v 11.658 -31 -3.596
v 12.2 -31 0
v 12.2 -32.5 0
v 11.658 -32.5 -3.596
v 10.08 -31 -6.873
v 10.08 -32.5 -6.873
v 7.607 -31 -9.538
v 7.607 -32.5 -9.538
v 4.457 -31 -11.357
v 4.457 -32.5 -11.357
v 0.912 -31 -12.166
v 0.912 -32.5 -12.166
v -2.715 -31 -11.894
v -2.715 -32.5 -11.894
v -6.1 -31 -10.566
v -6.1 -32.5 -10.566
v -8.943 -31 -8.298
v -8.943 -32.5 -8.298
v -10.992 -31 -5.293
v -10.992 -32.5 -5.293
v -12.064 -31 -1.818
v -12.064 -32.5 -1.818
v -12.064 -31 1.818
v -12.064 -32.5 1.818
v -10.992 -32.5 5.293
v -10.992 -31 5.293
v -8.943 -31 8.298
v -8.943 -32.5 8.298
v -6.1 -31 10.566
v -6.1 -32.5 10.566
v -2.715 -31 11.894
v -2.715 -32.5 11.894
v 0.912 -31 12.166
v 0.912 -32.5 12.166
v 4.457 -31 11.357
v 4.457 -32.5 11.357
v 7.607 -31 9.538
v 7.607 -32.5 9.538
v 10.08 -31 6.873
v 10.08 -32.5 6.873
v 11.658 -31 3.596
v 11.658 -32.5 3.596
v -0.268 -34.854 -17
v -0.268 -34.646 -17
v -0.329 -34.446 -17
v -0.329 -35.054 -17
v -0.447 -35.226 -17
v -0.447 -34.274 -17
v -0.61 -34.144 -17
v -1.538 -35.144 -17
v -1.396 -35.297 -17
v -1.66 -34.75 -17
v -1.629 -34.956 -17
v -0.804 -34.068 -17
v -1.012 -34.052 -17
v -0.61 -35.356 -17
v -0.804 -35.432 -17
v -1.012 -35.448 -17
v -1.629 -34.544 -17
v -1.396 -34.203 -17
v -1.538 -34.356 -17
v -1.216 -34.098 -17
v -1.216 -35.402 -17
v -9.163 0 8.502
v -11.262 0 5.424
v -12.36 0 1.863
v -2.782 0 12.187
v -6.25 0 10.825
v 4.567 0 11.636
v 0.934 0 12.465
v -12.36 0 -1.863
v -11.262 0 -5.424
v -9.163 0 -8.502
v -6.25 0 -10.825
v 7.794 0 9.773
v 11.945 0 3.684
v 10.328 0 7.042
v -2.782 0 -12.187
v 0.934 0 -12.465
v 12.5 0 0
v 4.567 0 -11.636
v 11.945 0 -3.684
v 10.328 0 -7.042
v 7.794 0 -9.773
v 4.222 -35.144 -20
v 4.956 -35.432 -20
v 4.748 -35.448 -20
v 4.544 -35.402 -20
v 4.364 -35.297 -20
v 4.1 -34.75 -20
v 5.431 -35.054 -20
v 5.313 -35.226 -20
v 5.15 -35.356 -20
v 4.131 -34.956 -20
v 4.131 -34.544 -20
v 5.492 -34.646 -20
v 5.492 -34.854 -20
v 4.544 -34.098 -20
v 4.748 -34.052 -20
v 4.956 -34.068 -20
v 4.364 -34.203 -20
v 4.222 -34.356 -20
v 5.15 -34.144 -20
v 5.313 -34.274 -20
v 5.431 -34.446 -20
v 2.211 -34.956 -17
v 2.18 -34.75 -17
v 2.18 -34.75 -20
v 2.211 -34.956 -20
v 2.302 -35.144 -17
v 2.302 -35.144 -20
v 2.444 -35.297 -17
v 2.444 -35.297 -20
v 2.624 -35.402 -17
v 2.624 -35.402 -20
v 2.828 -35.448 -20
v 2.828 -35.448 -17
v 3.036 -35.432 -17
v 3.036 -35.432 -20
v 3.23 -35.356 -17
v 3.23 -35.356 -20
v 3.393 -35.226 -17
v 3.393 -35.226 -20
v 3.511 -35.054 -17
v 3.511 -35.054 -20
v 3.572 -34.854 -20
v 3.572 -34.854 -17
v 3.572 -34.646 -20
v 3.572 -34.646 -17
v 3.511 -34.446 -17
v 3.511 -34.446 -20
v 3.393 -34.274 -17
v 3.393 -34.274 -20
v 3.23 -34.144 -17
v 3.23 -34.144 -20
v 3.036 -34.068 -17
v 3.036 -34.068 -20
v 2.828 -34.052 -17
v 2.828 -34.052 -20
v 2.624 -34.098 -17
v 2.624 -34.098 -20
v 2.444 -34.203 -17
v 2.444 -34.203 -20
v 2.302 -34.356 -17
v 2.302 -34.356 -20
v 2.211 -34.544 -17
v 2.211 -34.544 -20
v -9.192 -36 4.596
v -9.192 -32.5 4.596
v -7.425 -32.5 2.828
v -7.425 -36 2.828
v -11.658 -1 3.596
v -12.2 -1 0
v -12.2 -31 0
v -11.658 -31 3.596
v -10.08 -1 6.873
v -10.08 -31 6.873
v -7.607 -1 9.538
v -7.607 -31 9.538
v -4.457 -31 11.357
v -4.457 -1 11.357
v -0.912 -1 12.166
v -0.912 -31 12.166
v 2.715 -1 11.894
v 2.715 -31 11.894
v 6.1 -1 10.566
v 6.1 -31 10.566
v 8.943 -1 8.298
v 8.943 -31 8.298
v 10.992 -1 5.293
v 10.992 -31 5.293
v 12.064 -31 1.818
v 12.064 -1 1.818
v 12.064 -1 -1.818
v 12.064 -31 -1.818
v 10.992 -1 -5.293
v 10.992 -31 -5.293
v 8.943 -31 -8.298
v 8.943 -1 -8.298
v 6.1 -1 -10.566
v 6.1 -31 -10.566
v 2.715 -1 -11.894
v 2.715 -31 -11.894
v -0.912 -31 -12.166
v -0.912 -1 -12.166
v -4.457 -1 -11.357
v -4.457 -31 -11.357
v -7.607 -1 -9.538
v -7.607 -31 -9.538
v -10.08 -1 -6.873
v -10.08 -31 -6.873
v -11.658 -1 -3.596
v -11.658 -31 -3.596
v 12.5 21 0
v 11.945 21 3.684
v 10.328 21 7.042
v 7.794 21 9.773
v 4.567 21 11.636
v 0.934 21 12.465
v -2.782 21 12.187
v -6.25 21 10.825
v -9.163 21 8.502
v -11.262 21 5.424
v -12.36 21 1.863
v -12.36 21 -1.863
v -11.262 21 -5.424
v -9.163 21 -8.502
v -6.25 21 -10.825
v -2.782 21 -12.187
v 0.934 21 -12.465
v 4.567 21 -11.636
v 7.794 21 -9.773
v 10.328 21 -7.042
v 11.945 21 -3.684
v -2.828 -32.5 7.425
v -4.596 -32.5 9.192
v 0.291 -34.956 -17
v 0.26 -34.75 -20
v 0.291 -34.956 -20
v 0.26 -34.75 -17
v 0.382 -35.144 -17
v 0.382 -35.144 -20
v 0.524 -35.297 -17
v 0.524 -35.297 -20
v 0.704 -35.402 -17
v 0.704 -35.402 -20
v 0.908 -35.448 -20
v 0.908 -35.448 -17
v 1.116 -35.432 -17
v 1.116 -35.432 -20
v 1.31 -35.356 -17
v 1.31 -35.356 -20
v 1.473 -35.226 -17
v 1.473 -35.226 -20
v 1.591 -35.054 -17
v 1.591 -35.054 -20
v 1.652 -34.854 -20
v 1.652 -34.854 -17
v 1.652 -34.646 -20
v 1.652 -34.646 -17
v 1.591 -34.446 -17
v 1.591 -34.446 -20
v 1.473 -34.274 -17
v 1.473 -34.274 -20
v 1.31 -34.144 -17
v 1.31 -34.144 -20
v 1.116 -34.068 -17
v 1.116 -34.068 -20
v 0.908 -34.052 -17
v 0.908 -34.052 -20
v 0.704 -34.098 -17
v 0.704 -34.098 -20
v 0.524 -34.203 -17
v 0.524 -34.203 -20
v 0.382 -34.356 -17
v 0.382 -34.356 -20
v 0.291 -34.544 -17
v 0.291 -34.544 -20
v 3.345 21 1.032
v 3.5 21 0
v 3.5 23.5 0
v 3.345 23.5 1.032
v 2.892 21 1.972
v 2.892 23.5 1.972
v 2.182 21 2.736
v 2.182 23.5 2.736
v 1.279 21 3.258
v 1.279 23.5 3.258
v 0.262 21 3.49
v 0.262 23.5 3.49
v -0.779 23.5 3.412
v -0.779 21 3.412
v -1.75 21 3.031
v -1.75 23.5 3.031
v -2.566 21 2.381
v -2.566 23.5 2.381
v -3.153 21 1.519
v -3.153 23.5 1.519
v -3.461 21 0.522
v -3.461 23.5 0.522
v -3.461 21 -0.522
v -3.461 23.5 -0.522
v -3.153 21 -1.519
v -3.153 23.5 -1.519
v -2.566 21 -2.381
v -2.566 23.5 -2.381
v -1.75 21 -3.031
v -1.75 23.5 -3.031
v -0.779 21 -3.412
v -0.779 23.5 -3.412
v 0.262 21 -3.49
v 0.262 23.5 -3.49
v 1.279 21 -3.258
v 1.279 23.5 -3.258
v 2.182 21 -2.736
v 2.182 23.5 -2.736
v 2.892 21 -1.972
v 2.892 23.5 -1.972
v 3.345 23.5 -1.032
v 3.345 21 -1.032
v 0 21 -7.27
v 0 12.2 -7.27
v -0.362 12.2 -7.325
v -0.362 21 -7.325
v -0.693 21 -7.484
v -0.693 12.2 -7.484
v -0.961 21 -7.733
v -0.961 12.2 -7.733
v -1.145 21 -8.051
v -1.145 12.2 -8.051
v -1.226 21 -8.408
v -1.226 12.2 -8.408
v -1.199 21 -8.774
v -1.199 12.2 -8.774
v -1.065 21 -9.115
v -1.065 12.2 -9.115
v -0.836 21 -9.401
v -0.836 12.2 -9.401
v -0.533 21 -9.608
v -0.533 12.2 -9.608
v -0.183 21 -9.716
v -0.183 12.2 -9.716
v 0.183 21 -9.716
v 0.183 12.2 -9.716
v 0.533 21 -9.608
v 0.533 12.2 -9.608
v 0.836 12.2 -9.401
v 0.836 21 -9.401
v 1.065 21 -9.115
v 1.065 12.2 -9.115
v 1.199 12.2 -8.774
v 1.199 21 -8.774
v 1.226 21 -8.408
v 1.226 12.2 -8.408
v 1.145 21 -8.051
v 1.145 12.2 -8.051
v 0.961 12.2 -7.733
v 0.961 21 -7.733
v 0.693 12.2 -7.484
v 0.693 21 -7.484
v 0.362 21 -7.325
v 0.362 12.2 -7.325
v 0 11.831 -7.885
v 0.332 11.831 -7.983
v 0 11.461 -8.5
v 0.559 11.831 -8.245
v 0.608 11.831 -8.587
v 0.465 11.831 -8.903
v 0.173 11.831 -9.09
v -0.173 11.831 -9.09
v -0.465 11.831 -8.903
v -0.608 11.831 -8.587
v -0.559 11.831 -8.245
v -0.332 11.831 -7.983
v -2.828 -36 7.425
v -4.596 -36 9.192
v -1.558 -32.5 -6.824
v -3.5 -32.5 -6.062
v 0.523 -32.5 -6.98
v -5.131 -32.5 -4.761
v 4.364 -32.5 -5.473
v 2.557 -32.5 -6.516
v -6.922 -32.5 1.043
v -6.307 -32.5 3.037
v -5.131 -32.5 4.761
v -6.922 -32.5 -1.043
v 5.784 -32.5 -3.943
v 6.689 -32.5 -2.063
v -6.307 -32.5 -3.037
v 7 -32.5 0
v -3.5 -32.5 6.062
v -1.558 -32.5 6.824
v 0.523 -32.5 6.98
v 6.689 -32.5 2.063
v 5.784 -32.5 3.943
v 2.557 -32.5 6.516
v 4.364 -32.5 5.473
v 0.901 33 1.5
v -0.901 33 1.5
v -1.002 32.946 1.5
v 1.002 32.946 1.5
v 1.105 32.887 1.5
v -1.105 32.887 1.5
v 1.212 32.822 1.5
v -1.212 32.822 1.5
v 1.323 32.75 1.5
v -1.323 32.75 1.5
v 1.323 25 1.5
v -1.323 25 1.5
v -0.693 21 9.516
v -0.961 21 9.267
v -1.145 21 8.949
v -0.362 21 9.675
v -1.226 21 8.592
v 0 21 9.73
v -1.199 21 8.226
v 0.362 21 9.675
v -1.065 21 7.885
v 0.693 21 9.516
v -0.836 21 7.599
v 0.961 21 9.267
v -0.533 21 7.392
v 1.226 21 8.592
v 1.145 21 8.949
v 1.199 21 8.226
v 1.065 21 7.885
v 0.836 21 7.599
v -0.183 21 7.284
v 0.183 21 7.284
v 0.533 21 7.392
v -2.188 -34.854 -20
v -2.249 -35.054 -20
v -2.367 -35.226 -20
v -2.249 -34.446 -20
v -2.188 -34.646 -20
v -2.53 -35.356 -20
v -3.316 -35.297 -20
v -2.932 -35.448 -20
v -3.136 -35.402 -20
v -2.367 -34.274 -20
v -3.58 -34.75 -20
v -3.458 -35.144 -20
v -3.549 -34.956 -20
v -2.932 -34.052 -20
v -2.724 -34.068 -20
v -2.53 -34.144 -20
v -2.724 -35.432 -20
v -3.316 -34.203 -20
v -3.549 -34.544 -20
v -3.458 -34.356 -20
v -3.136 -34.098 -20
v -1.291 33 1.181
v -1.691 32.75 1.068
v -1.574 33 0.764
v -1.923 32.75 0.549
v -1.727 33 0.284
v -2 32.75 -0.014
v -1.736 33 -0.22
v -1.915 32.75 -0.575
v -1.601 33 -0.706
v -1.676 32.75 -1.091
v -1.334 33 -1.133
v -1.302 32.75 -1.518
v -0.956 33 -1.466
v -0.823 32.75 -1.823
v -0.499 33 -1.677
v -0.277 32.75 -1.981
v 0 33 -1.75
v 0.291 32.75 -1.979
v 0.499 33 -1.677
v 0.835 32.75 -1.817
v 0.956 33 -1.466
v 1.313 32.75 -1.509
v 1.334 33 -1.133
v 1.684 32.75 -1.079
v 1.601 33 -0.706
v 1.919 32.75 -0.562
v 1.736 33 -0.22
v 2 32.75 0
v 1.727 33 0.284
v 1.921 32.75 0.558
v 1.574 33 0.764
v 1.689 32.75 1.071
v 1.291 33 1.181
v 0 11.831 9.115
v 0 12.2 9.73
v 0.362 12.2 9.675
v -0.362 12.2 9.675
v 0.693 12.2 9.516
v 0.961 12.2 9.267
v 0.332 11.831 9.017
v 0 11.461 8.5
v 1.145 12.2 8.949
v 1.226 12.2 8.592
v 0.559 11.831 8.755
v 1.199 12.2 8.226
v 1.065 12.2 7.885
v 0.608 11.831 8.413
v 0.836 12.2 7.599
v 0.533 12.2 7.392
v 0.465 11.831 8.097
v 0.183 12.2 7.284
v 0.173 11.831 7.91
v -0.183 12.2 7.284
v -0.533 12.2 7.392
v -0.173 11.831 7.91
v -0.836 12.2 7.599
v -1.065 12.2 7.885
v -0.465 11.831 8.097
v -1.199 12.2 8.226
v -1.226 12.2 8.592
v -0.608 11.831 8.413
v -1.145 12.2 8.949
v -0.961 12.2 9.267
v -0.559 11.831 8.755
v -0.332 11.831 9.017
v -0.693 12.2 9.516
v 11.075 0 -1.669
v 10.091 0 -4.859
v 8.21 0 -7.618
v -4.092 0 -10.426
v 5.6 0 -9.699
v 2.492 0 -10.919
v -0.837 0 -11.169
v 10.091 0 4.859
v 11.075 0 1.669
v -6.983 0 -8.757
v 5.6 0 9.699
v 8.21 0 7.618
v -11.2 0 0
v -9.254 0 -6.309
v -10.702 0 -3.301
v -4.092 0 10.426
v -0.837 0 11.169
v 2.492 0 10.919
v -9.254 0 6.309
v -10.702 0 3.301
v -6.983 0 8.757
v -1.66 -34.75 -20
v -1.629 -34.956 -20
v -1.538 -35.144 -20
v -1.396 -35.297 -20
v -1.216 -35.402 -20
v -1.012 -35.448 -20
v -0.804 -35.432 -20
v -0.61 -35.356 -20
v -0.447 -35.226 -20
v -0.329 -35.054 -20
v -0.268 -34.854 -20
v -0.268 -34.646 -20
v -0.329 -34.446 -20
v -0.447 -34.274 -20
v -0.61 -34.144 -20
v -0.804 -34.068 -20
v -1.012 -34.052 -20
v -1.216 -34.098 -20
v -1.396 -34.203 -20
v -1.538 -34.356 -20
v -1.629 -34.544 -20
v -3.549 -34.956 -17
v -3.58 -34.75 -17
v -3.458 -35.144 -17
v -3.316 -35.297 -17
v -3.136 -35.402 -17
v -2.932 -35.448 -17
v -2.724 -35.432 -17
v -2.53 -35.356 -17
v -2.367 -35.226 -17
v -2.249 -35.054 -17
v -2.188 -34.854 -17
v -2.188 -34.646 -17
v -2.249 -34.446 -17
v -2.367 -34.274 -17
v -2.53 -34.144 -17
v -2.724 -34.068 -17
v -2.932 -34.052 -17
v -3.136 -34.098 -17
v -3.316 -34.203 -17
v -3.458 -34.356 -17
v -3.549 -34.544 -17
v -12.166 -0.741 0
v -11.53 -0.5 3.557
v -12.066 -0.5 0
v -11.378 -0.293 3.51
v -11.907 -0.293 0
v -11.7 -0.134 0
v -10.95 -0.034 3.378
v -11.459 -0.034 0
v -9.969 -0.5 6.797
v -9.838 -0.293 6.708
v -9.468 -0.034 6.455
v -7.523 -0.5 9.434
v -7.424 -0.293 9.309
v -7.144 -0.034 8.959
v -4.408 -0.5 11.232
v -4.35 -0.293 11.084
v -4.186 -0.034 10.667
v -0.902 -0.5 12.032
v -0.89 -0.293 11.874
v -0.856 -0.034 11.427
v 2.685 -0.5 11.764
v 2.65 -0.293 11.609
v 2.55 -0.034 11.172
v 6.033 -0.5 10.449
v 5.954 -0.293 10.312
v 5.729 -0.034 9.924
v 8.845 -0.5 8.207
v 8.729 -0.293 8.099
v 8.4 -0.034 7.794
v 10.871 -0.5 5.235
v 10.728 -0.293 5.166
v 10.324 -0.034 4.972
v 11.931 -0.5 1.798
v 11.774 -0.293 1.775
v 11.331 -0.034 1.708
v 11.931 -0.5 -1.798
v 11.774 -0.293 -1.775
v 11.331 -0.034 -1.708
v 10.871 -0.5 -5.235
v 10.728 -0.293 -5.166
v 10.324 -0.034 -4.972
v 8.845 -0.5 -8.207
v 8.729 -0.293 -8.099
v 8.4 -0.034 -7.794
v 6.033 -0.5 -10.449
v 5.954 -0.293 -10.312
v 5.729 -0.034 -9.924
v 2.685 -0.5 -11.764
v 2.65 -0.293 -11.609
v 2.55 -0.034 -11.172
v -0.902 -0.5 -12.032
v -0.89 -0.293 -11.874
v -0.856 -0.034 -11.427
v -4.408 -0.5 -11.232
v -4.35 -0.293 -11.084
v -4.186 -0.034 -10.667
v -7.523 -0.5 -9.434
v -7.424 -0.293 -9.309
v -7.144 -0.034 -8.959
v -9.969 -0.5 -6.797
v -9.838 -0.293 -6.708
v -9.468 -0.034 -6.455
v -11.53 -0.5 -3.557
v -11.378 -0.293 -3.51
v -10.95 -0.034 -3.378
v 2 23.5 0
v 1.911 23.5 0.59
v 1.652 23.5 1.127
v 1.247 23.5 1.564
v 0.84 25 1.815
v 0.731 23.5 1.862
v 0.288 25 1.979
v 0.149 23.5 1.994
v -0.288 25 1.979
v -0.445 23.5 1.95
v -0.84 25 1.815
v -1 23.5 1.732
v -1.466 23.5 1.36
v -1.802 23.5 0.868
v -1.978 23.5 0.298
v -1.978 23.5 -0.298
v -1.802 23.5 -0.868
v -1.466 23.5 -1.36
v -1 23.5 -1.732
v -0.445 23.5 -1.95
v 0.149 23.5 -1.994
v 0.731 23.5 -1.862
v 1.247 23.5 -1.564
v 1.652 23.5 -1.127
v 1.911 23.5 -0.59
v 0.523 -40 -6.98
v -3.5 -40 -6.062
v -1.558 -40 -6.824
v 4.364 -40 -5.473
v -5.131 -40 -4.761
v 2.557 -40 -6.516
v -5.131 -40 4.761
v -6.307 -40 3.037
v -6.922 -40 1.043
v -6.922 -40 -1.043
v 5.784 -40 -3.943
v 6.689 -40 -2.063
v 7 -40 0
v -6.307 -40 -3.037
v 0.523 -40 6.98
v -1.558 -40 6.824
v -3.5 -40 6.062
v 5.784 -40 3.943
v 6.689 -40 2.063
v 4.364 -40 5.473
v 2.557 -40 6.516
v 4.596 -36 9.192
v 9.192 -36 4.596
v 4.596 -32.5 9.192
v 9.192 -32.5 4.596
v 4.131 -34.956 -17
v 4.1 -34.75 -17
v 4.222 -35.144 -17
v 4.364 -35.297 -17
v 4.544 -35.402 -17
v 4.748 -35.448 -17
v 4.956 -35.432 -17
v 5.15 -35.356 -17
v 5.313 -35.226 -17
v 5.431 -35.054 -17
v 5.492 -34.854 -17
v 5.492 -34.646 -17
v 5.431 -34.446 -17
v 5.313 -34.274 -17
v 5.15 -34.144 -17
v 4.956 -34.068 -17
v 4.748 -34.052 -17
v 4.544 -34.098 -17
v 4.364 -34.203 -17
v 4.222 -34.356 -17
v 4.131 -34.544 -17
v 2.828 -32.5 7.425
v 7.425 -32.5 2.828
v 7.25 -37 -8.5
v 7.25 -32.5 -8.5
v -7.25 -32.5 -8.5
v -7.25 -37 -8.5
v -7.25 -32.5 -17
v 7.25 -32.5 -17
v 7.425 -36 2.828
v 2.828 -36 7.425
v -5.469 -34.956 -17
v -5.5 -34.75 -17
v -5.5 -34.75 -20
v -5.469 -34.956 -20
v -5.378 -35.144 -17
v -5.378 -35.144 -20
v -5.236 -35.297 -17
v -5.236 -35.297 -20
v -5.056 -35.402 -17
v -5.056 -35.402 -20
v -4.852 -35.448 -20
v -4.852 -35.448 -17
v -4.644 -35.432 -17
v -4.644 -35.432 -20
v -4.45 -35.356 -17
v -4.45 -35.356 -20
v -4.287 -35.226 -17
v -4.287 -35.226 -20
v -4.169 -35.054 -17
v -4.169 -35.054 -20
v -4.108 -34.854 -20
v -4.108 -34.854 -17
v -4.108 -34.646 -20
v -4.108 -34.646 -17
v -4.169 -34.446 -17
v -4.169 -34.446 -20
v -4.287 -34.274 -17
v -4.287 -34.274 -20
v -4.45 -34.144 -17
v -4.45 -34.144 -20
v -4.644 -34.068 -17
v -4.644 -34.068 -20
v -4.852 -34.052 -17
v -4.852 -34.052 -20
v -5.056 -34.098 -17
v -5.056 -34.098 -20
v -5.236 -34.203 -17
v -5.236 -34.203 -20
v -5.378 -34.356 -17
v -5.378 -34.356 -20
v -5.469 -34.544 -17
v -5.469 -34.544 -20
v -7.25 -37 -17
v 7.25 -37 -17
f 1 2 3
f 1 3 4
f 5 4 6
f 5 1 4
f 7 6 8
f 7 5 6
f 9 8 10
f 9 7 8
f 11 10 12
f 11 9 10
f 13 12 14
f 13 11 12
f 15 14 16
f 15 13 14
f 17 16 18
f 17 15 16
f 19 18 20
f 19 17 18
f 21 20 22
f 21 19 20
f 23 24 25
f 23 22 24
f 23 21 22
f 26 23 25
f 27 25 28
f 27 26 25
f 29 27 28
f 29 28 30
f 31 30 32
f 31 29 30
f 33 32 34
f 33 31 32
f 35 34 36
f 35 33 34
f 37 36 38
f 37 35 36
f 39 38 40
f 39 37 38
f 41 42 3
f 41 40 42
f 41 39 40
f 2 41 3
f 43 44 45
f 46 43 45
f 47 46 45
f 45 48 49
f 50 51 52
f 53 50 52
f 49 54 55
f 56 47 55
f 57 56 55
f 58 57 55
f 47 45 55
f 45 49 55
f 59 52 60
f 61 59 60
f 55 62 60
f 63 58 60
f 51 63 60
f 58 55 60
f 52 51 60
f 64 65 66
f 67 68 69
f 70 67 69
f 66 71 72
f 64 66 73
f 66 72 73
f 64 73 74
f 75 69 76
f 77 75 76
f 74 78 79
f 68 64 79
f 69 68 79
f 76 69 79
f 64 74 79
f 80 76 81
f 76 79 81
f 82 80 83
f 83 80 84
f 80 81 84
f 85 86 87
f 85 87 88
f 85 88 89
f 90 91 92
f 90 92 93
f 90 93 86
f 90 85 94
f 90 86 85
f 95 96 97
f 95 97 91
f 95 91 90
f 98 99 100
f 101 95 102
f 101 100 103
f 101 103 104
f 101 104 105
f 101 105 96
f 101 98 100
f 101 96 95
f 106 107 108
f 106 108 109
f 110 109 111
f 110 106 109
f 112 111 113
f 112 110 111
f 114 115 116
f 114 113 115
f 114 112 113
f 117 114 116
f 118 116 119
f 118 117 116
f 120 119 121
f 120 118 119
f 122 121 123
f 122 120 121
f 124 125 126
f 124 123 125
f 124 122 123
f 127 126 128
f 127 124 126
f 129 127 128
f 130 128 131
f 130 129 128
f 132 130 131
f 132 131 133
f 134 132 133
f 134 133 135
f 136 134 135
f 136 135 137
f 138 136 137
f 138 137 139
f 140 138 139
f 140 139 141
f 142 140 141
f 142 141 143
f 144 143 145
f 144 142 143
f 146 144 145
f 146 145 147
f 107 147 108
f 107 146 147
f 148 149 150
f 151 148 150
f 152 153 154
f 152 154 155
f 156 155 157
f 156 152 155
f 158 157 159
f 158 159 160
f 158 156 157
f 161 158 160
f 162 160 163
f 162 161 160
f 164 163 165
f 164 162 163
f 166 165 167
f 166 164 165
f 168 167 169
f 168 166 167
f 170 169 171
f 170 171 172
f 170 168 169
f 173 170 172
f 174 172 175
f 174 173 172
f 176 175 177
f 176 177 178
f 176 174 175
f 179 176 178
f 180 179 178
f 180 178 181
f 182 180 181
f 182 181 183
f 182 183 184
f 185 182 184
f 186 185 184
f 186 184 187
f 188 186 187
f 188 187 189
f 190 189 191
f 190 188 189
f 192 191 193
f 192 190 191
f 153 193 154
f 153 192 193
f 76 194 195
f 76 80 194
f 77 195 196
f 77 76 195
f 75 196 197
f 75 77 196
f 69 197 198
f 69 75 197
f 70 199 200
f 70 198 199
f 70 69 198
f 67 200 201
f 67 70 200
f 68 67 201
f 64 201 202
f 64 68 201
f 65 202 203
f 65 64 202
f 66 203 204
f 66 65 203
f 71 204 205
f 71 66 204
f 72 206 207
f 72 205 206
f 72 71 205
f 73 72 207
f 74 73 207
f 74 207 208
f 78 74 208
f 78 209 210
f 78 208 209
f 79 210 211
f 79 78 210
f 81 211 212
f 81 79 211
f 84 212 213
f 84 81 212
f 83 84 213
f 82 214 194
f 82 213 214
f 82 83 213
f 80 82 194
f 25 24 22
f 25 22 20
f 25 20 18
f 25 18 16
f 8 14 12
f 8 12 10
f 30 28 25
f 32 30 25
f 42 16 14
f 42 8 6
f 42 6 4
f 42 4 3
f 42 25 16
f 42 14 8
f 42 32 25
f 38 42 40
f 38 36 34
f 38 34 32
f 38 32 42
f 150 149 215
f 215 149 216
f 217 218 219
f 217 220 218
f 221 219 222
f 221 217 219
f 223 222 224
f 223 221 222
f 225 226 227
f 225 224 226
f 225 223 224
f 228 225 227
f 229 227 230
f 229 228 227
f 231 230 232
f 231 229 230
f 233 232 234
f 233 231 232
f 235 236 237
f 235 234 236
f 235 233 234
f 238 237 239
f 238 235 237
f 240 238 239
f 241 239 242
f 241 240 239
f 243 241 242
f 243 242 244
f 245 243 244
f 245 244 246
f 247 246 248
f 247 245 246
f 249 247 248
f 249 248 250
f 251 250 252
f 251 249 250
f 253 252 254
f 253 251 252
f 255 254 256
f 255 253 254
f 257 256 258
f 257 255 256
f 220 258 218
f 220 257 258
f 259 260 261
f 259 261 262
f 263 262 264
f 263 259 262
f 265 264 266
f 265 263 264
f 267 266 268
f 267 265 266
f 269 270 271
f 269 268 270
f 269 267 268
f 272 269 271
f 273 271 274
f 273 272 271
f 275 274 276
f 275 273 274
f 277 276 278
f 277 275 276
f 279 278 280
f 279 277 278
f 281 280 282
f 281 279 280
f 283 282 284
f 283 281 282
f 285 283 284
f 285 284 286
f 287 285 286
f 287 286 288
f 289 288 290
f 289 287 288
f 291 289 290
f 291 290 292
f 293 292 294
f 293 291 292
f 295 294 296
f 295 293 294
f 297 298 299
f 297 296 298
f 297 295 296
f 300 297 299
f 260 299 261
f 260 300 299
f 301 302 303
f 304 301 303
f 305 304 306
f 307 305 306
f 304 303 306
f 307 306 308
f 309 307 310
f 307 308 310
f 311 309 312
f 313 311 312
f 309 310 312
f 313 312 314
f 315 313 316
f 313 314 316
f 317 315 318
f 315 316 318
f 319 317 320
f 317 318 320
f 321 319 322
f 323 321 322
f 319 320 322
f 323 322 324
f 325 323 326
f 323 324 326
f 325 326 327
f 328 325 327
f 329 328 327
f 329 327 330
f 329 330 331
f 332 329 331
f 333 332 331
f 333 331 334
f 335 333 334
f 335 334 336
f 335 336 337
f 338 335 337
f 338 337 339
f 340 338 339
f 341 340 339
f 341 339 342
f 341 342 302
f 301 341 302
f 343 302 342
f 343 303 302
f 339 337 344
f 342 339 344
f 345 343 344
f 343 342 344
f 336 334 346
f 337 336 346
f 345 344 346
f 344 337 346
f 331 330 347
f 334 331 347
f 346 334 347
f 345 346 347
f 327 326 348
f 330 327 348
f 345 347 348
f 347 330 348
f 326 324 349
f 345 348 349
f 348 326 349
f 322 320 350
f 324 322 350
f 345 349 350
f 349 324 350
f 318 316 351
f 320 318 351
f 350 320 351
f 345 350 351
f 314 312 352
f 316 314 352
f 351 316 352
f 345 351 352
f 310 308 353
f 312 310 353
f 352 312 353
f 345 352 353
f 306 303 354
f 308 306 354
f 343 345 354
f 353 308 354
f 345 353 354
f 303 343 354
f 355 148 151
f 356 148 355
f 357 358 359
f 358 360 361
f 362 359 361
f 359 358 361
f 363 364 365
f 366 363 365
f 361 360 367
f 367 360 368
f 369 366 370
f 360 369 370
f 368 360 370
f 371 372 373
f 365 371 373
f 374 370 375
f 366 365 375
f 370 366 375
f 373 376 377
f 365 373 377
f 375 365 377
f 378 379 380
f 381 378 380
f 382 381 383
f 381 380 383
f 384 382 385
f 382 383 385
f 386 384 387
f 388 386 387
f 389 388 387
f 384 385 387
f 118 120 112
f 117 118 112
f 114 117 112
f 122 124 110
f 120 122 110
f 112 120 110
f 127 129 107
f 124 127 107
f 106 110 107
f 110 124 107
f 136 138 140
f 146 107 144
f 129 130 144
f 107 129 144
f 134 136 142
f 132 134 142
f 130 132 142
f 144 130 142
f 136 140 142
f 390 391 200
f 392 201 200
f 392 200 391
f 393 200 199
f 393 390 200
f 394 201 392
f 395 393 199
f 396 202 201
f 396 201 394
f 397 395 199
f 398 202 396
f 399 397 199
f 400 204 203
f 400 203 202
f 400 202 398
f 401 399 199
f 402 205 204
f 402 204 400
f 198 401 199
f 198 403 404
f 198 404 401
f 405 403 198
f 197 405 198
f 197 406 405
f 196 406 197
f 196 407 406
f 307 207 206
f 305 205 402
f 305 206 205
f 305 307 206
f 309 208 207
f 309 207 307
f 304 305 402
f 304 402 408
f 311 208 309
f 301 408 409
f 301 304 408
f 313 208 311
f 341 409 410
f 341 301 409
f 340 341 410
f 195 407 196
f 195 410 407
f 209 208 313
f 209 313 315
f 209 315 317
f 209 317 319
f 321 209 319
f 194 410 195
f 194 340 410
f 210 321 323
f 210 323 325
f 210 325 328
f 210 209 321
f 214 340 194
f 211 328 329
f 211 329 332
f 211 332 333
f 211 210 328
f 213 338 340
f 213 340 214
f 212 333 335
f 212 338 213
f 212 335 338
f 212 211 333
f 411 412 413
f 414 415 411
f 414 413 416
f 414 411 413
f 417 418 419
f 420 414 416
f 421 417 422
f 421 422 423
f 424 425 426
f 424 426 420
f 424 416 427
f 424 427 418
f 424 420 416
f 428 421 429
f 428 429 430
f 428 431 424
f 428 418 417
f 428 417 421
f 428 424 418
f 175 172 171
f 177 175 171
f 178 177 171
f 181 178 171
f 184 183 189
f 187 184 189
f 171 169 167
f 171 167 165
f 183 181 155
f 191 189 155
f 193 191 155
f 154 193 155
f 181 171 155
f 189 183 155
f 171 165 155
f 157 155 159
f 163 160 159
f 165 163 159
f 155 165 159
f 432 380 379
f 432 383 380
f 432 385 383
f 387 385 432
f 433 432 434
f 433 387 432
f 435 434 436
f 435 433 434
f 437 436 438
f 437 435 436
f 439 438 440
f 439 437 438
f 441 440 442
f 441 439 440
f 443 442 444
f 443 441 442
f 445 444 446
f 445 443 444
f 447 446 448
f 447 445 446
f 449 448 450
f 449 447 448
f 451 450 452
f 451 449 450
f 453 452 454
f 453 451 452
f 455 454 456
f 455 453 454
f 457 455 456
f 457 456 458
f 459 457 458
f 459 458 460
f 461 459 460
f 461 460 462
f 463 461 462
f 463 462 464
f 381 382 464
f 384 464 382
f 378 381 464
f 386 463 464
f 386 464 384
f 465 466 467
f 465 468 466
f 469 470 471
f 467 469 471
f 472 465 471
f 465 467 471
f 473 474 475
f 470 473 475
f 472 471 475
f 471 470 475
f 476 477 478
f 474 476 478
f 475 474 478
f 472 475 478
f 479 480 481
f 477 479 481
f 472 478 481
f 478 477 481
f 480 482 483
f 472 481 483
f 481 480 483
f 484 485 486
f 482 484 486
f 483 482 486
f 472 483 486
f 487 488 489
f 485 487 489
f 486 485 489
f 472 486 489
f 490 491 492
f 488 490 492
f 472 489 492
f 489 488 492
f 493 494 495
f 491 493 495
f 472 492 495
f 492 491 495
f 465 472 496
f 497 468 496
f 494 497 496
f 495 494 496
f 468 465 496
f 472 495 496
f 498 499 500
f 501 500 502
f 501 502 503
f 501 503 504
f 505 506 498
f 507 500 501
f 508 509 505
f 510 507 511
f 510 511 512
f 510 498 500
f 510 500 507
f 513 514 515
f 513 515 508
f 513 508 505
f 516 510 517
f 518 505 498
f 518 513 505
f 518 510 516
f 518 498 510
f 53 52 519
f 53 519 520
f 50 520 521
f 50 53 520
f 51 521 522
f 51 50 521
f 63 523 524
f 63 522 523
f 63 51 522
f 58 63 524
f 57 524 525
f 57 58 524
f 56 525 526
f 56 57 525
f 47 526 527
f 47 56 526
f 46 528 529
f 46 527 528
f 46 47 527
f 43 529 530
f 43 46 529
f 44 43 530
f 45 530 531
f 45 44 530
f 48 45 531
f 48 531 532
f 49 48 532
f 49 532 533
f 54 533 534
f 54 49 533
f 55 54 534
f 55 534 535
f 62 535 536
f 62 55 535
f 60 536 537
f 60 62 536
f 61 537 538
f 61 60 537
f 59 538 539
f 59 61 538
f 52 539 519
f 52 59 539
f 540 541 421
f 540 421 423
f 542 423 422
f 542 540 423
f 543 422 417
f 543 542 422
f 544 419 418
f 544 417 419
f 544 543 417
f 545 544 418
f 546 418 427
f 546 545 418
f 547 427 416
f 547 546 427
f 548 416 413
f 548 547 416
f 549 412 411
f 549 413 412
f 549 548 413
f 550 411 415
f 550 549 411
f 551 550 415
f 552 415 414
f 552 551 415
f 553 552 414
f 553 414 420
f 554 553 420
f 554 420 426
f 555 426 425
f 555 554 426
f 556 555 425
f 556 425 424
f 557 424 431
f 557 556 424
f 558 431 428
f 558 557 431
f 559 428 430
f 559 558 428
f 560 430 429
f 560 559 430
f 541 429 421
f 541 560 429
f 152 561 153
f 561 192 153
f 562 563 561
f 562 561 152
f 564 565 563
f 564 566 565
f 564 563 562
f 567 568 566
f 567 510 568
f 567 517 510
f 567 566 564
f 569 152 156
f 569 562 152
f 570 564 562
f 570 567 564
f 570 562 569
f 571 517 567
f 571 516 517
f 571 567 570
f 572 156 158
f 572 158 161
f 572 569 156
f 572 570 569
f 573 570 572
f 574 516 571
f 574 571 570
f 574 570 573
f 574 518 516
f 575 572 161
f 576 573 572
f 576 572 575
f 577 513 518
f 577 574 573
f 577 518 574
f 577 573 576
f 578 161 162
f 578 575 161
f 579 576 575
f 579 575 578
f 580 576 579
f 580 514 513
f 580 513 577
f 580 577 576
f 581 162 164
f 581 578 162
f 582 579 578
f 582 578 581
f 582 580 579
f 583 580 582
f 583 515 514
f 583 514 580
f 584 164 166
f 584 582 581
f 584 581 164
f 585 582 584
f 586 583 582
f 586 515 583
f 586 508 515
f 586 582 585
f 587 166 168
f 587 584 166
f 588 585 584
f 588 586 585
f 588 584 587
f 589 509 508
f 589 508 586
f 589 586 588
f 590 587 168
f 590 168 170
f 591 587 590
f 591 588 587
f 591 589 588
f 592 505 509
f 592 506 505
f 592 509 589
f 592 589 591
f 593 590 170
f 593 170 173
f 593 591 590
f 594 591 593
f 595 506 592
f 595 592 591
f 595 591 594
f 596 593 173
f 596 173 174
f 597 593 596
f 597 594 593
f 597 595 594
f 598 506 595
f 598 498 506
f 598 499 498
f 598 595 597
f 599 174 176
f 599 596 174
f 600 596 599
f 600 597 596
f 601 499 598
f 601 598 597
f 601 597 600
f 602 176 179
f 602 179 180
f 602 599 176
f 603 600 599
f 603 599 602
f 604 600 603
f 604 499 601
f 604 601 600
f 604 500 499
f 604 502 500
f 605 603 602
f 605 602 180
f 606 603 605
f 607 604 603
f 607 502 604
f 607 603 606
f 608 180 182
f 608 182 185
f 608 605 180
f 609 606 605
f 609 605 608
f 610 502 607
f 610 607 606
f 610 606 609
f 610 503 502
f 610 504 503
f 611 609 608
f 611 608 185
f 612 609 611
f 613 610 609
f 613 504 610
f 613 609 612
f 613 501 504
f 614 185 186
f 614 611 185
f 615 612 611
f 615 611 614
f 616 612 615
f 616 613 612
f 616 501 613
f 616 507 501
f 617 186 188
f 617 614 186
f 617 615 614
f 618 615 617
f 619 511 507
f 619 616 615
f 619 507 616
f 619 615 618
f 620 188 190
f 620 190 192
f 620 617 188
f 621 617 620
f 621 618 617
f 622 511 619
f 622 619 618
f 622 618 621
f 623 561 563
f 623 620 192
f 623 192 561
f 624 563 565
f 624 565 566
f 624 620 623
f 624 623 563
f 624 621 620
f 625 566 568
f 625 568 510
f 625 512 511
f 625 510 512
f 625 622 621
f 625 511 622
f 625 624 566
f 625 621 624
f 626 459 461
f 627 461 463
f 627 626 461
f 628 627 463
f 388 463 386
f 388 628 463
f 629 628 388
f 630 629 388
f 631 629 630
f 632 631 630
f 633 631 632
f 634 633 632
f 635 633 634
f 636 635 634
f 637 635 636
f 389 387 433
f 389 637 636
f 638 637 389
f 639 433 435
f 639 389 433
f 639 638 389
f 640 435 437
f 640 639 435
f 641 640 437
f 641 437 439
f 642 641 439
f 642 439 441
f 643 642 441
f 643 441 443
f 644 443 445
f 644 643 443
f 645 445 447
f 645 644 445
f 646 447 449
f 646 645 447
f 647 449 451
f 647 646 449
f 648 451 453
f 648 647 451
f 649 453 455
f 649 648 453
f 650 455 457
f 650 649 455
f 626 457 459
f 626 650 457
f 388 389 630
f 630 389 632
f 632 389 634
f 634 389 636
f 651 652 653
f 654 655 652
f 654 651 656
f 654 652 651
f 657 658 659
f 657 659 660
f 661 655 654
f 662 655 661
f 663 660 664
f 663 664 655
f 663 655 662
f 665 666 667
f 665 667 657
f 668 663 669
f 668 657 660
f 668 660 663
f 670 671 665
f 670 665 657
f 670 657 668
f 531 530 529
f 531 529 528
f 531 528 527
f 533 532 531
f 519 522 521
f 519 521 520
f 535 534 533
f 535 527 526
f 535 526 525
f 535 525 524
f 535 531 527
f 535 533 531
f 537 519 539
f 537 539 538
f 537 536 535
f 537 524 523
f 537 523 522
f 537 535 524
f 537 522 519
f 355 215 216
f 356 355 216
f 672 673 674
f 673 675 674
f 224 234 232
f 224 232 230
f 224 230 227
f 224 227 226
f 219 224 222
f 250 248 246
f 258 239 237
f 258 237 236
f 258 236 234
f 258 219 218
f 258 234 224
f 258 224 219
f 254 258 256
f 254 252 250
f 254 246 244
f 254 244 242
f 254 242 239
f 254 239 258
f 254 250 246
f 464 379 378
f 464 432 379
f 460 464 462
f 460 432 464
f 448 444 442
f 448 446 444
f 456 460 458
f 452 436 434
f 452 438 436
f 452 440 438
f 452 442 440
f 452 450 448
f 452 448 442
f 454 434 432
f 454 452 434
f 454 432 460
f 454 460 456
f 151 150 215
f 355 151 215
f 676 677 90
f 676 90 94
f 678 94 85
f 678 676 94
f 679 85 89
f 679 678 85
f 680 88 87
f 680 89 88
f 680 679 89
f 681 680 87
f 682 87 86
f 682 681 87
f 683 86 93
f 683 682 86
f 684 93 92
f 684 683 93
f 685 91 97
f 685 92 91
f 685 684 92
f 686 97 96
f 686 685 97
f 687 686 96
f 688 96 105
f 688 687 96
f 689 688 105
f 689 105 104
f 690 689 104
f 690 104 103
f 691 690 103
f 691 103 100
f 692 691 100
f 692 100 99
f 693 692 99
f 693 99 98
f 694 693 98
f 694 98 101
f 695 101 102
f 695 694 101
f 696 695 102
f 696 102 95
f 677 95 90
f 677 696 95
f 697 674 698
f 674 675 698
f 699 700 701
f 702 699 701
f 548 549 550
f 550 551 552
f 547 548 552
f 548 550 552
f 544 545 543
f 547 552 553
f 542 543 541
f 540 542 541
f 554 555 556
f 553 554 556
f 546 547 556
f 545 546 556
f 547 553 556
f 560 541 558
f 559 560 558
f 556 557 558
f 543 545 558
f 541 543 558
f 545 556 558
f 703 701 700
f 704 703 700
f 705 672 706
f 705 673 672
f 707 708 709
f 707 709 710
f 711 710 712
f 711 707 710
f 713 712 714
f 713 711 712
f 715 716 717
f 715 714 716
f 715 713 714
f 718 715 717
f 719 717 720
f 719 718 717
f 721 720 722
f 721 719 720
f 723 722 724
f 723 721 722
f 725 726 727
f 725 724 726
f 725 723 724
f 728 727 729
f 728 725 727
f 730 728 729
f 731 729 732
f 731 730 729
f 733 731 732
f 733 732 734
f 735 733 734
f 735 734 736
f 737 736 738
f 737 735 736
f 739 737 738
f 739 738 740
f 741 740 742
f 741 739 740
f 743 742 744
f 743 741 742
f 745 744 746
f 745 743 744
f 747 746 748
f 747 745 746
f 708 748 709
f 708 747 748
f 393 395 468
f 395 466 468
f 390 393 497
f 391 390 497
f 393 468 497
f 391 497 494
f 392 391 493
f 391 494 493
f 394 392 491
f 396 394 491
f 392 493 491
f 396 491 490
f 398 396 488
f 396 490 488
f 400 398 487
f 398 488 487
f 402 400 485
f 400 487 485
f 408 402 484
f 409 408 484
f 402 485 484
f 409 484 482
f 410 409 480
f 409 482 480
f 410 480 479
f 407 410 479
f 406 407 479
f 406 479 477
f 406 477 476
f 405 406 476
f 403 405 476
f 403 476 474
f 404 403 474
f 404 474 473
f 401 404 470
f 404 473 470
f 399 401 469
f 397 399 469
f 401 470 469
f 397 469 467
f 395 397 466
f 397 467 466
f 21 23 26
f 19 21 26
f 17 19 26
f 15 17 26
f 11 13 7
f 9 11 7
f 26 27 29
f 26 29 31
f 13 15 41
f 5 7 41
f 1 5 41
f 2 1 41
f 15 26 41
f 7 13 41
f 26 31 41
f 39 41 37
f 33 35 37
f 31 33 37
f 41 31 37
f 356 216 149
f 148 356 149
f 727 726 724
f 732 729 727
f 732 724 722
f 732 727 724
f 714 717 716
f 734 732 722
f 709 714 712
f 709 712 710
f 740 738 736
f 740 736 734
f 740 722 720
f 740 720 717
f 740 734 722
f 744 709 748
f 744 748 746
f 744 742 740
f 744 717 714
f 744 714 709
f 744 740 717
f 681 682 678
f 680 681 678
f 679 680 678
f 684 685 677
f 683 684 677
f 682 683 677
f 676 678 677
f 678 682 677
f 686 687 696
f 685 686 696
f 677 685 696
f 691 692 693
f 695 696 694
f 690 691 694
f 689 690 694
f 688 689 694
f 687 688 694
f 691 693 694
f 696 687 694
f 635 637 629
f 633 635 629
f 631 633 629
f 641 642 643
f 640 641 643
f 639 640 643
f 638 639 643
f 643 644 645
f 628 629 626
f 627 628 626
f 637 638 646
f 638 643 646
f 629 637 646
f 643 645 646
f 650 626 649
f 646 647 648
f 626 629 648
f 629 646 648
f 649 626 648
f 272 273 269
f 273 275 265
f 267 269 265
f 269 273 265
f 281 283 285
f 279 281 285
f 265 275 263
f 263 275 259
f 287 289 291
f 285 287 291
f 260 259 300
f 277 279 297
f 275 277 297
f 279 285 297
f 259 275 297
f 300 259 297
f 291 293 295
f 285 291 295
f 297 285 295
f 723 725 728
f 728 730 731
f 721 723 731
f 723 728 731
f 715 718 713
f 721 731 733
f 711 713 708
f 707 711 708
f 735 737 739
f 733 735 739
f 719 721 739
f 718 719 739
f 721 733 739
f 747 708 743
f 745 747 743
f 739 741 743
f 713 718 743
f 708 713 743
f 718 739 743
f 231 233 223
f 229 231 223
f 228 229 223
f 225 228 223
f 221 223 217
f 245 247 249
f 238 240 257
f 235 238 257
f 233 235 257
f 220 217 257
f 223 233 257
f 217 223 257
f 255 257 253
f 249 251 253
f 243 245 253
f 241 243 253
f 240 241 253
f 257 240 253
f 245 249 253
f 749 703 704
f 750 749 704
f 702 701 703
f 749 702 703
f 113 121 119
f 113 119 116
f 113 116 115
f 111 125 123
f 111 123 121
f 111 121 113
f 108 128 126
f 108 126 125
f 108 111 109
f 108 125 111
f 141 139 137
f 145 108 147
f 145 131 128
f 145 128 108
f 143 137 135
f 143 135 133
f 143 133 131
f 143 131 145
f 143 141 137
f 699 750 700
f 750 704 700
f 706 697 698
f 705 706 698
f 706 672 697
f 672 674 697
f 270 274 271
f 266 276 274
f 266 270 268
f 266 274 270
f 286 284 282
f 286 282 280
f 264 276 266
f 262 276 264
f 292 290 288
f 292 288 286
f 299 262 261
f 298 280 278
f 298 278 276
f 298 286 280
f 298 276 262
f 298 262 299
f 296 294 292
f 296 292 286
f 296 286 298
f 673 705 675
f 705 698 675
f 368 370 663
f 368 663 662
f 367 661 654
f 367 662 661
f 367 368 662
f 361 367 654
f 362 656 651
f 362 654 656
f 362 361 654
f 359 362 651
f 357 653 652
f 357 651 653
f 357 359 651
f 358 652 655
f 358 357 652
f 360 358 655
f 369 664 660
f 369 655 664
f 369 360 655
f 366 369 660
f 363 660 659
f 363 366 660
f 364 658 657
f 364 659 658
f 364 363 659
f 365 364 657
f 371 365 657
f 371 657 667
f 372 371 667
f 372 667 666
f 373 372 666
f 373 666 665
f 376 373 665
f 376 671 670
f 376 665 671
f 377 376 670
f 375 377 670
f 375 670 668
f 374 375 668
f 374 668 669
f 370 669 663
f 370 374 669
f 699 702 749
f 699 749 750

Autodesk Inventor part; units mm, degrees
ref_plane "YZ Plane" through (0, 0, 0) normal (1, 0, 0) x (0, 1, 0)
ref_plane "XZ Plane" through (0, 0, 0) normal (0, 1, 0) x (-1, 0, 0)
ref_plane "XY Plane" through (0, 0, 0) normal (0, 0, 1) x (1, 0, 0)
sketch "Sketch1" plane through (0, 0, 0) normal (0, 1, 0) x (-1, 0, 0)
  circle A0 centre (0, 0) radius 12.2
  dimension "d0" = 24.4
extrude "Extrusion1" add sketch "Sketch1" against normal blind 31
fillet "Fillet1" radius 1 1 edges at (12.2, 0, 0)
sketch "Sketch2" plane through (0, -31, 0) normal (0, -1, 0) x (1, 0, 0)
  circle A0 centre (0, 0) radius 12.2 projected
extrude "Extrusion2" add sketch "Sketch2" along normal blind 1.5 separate body
sketch "Sketch3" plane through (0, -32.5, 0) normal (0, -1, 0) x (1, 0, 0)
  circle A0 centre (0, 0) radius 7
  dimension "d6" = 14
extrude "Extrusion3" add sketch "Sketch3" along normal blind 7.5 separate body
sketch "Sketch4" plane through (0, -32.5, 0) normal (0, -1, 0) x (1, 0, 0)
  circle A0 centre (0, 0) radius 6.75 construction
  line L0 (-7.4246, 2.8284) -> (-2.8284, 7.4246)
  line L1 (-2.8284, 7.4246) -> (-4.5962, 9.1924)
  line L2 (-4.5962, 9.1924) -> (-9.1924, 4.5962)
  line L3 (-9.1924, 4.5962) -> (-7.4246, 2.8284)
  line L4 (-7.4246, 2.8284) -> (-4.5962, 9.1924) construction
  line L5 (-2.8284, 7.4246) -> (-9.1924, 4.5962) construction
  line L6 (0, 0) -> (-6.0104, 6.0104) construction
  line L7 (0, 0) -> (-12.2, 0) construction
  circle A1 centre (0, 0) radius 12.2 construction
  point P0 (4.773, -4.773)
  dimension "d9" = 13.5
  dimension "d10" = 6.5
  dimension "d11" = 2.5
  dimension "d12" = 45
  dimension "d13" = 16.5
extrude "Extrusion4" add sketch "Sketch4" along normal blind 3.5 separate body
pattern_circular "Circular Pattern1" count 2 over 90 about axis through (0, -32.5, 0) along (0, 1, 0) of "Extrusion4" bodies 4
sketch "Sketch5" plane through (0, -32.5, 0) normal (0, -1, 0) x (1, 0, 0)
  line L0 (-7.25, -17) -> (7.25, -17)
  line L1 (7.25, -17) -> (7.25, -8.5)
  line L2 (7.25, -8.5) -> (-7.25, -8.5)
  line L3 (-7.25, -8.5) -> (-7.25, -17)
  line L4 (-7.25, -17) -> (7.25, -8.5) construction
  line L5 (7.25, -17) -> (-7.25, -8.5) construction
  circle A0 centre (0, 0) radius 7 projected
  point P0 (0, -12.75)
  point P1 (0, -12.75)
  dimension "d19" = 17
  dimension "d20" = 8.5
  dimension "d21" = 14.5
extrude "Extrusion5" add sketch "Sketch5" along normal blind 4.5 separate body contours L3 L2 L1 L0
sketch "Sketch6" plane through (7.25, -32.5, -17) normal (0, 0, -1) x (-1, 0, 0)
  line L0 (12.05, -2.25) -> (10.13, -2.25) construction
  line L1 (10.13, -2.25) -> (8.21, -2.25) construction
  line L2 (8.21, -2.25) -> (6.29, -2.25) construction
  line L3 (6.29, -2.25) -> (4.37, -2.25) construction
  line L4 (4.37, -2.25) -> (2.45, -2.25) construction
  circle A0 centre (12.05, -2.25) radius 0.7
  circle A1 centre (10.13, -2.25) radius 0.7
  circle A2 centre (8.21, -2.25) radius 0.7
  circle A3 centre (6.29, -2.25) radius 0.7
  circle A4 centre (4.37, -2.25) radius 0.7
  circle A5 centre (2.45, -2.25) radius 0.7
  line L5 (14.5, 0) -> (14.5, -4.5) projected
  line L6 (14.5, -4.5) -> (0, -4.5) projected
  point P0 (7.25, 32.5)
  point P1 (14.5, -2.25)
  point P2 (7.25, -2.25)
  point P3 (7.25, -4.5)
  dimension "d24" = 9.6
  dimension "d25" = 1.4
extrude "Extrusion6" add sketch "Sketch6" along normal blind 3 separate body contours A0
extrude "Extrusion7" add sketch "Sketch6" along normal blind 3 separate body contours A1
extrude "Extrusion8" add sketch "Sketch6" along normal blind 3 separate body contours A2
extrude "Extrusion9" add sketch "Sketch6" along normal blind 3 separate body contours A3
extrude "Extrusion10" add sketch "Sketch6" along normal blind 3 separate body contours A4
extrude "Extrusion11" add sketch "Sketch6" along normal blind 3 separate body contours A5
sketch "Sketch7" plane through (0, 0, 0) normal (0, 1, 0) x (1, 0, 0)
  circle A0 centre (0, 0) radius 12.5
  dimension "d38" = 25
extrude "Extrusion12" add sketch "Sketch7" along normal blind 21 separate body
sketch "Sketch8" plane through (0, 21, 0) normal (0, 1, 0) x (1, 0, 0)
  circle A0 centre (0, 0) radius 11.2 construction
  circle A1 centre (0, 0) radius 3.5
  dimension "d41" = 7
extrude "Extrusion13" add sketch "Sketch8" along normal blind 2.5 separate body
sketch "Sketch9" plane through (0, 23.5, 0) normal (0, 1, 0) x (1, 0, 0)
  circle A0 centre (0, 0) radius 2
  dimension "d44" = 4
extrude "Extrusion14" add sketch "Sketch9" along normal blind 9.5 separate body
chamfer "Chamfer1" distance 0.25 angle 45 1 edges at (-2, 33, 0)
sketch "Sketch10" plane through (0, 33, 0) normal (0, 1, 0) x (1, 0, 0)
  line L0 (-1.3229, -2) -> (1.3229, -2)
  line L1 (1.3229, -2) -> (1.3229, -1.5)
  line L2 (1.3229, -1.5) -> (-1.3229, -1.5)
  line L3 (-1.3229, -1.5) -> (-1.3229, -2)
  circle A0 centre (0, 0) radius 2 construction
  dimension "d50" = 1.5
extrude "Extrusion15" cut sketch "Sketch10" against normal blind 8 bodies 14
sketch "Sketch11" plane through (0, 21, 0) normal (0, 1, 0) x (1, 0, 0)
  circle A0 centre (0, 0) radius 12.5 construction
  line L0 (0, 8.5) -> (0, -8.5) construction
  line L1 (7.25, 8.5) -> (-7.25, 8.5) construction
  dimension "d53" = 17
hole "Hole1" at (0, 21, -8.5) at (0, 21, 8.5) direction (0, -1, 0) diameter 2.459 depth 8.8 tip angle 118 bodies 12 thread size "M3x0.5" class "6H" standard "ISO Metric profile"
properties part number "JGA25-371_12VDC_100RPM"
